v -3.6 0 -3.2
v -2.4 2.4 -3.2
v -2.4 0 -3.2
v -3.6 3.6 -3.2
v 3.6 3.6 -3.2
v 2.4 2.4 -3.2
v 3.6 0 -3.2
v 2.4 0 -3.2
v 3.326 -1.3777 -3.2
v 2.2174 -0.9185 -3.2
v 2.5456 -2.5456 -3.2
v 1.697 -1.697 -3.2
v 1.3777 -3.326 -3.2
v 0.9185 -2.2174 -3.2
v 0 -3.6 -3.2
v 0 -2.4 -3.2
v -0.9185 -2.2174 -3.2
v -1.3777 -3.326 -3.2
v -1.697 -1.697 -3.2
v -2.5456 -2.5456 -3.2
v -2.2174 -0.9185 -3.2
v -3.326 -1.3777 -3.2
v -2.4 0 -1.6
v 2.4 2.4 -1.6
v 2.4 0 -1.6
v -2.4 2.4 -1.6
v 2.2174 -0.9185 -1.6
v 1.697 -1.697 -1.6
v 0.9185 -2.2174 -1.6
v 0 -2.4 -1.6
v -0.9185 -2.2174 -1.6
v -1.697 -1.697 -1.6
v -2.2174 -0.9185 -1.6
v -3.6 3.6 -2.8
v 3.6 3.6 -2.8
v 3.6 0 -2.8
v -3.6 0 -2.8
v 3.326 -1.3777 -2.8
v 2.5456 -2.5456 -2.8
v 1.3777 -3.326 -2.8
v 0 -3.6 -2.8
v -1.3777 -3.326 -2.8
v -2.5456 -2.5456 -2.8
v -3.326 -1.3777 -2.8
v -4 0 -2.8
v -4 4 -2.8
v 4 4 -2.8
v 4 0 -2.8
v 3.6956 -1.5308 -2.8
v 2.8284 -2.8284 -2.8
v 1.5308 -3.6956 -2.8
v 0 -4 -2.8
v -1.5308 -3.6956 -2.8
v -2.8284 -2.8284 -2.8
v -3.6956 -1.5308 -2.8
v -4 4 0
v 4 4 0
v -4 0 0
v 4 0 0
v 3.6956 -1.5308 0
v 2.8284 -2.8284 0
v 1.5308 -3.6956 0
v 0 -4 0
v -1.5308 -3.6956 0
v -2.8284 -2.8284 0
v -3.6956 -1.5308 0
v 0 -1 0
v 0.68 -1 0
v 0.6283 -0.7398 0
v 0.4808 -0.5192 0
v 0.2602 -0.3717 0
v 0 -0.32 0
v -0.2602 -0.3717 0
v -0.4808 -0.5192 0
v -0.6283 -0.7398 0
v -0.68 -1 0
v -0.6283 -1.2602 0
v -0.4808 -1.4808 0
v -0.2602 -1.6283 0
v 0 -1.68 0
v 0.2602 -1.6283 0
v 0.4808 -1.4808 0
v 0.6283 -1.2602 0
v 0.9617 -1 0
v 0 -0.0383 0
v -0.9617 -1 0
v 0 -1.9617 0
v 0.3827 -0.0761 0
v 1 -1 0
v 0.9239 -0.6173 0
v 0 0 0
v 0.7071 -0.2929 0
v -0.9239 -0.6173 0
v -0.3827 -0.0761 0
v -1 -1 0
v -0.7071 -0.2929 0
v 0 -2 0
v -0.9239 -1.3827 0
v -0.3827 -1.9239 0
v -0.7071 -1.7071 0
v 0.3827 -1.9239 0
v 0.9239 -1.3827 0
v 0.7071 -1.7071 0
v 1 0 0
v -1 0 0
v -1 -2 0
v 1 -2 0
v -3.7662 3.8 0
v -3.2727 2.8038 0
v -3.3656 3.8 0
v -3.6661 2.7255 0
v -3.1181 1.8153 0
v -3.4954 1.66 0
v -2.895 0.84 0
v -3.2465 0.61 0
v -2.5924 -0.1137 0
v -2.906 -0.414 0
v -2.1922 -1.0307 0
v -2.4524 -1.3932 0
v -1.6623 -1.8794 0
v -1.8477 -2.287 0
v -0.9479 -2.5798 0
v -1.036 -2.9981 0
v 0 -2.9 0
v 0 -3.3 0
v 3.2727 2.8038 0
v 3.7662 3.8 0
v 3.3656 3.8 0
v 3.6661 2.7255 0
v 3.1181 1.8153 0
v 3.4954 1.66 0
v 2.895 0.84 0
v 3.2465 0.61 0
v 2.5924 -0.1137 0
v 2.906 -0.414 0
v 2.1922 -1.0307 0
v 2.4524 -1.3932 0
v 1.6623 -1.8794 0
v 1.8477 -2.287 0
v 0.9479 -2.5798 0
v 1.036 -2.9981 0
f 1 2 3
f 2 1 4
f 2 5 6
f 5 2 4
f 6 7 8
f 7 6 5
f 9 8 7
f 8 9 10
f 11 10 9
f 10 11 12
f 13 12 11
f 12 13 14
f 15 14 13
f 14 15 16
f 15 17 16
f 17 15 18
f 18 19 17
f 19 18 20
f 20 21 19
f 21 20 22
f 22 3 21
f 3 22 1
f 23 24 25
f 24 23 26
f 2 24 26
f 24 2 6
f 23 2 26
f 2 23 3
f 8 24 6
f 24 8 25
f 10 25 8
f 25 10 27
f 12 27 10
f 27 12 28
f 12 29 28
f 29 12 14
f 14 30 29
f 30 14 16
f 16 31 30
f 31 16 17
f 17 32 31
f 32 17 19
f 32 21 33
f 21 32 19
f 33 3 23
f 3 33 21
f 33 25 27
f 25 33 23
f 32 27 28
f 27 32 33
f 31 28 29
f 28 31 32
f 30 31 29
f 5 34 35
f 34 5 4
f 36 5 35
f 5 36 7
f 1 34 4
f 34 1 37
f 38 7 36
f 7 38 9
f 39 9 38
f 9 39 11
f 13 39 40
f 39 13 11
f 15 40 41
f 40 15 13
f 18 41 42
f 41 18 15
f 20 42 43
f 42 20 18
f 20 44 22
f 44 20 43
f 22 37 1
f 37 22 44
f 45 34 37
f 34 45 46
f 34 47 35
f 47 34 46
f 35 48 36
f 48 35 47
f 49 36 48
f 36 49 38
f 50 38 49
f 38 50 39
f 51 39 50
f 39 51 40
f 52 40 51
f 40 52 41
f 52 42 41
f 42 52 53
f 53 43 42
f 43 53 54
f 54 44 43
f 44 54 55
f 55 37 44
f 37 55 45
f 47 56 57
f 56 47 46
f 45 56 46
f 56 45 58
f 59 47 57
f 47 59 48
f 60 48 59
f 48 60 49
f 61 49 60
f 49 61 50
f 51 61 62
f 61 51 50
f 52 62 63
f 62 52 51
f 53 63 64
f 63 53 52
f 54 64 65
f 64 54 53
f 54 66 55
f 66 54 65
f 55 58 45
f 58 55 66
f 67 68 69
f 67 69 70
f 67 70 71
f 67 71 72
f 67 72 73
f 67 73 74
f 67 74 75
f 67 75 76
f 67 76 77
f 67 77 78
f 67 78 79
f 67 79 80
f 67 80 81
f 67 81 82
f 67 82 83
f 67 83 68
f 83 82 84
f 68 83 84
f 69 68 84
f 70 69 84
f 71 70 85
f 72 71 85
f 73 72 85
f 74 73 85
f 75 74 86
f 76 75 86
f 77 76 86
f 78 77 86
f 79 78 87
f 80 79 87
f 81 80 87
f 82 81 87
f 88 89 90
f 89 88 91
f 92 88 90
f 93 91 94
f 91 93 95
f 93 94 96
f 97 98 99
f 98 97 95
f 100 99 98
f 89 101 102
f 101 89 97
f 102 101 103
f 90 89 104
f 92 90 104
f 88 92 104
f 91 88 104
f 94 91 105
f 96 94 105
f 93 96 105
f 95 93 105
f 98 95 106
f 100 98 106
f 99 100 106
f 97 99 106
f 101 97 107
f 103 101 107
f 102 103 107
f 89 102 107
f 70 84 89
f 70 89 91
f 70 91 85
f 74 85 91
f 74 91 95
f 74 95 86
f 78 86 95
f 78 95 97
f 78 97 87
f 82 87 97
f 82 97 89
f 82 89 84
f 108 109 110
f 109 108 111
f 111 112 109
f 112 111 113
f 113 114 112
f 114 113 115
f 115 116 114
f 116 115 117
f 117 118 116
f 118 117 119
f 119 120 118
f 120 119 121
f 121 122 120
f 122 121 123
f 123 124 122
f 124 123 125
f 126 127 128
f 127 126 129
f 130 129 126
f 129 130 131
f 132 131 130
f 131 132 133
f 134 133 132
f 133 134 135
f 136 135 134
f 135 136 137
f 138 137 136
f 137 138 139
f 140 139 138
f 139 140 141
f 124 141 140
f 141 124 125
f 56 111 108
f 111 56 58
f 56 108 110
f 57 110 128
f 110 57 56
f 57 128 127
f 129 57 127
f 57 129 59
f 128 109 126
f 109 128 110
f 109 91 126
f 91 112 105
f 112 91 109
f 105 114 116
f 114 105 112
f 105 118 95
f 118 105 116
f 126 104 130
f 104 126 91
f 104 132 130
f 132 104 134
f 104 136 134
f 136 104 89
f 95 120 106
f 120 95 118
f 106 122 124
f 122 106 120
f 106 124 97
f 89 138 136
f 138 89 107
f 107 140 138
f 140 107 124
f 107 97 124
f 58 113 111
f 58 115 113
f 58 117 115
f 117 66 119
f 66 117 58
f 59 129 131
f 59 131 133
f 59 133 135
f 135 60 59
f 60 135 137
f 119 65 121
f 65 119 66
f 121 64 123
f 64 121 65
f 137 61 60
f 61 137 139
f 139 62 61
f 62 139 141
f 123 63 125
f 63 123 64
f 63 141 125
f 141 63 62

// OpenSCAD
// file: ../p/2-4edge.scad
use <../lib.scad>
function ldraw_lib__2_4edge() = [
// 0 Circle 0.5
// 0 Name: 2-4edge.dat
// 0 Author: James Jessiman
// 0 !LDRAW_ORG Primitive UPDATE 2017-01
// 0 !LICENSE Licensed under CC BY 4.0 : see CAreadme.txt
// 
// 0 BFC CERTIFY CCW
  [0,"BFC","CERTIFY"],
  [0,"BFC","CCW"],
// 
// 0 !HISTORY 2007-06-24 [PTadmin] Header formatted for Contributor Agreement
// 0 !HISTORY 2008-07-01 [PTadmin] Official Update 2008-01
// 0 !HISTORY 2017-01-15 [Steffen] BFCed
// 0 !HISTORY 2017-12-30 [PTadmin] Official Update 2017-01
// 
// 
// 2 24 1 0 0 0.9239 0 0.3827
  [2,24,1,0,0,0.9239,0,0.3827],
// 2 24 0.9239 0 0.3827 0.7071 0 0.7071
  [2,24,0.9239,0,0.3827,0.7071,0,0.7071],
// 2 24 0.7071 0 0.7071 0.3827 0 0.9239
  [2,24,0.7071,0,0.7071,0.3827,0,0.9239],
// 2 24 0.3827 0 0.9239 0 0 1
  [2,24,0.3827,0,0.9239,0,0,1],
// 2 24 0 0 1 -0.3827 0 0.9239
  [2,24,0,0,1,-0.3827,0,0.9239],
// 2 24 -0.3827 0 0.9239 -0.7071 0 0.7071
  [2,24,-0.3827,0,0.9239,-0.7071,0,0.7071],
// 2 24 -0.7071 0 0.7071 -0.9239 0 0.3827
  [2,24,-0.7071,0,0.7071,-0.9239,0,0.3827],
// 2 24 -0.9239 0 0.3827 -1 0 0
  [2,24,-0.9239,0,0.3827,-1,0,0],
];
module ldraw_lib__2_4edge(step=0, col=false, unit=2/5, alt=false, line=0.2, solid=!$preview)
    makepoly(ldraw_lib__2_4edge(), step=step, col=col, unit=unit, alt=alt, line=line, solid=solid);
ldraw_lib__2_4edge(line=0.2);
// file: ../p/2-4cyli.scad
use <../lib.scad>
function ldraw_lib__2_4cyli() = [
// 0 Cylinder 0.5
// 0 Name: 2-4cyli.dat
// 0 Author: James Jessiman
// 0 !LDRAW_ORG Primitive UPDATE 2005-01
// 0 !LICENSE Licensed under CC BY 4.0 : see CAreadme.txt
// 
// 0 BFC CERTIFY CCW
  [0,"BFC","CERTIFY"],
  [0,"BFC","CCW"],
// 
// 0 !HISTORY 2002-03-23 [sbliss] Added BFC statement; compacted code
// 0 !HISTORY 2002-04-25 [PTadmin] Official Update 2002-02
// 0 !HISTORY 2004-12-11 [nielsk] Recreated using Primitive Generator, Edge lines fixed, BFC changed to CCW
// 0 !HISTORY 2005-12-28 [PTadmin] Official Update 2005-01
// 0 !HISTORY 2007-06-24 [PTadmin] Header formatted for Contributor Agreement
// 0 !HISTORY 2008-07-01 [PTadmin] Official Update 2008-01
// 
// 
// 4 16 .9239 1 .3827 .9239 0 .3827 1 0 0 1 1 0
  [4,16,.9239,1,.3827,.9239,0,.3827,1,0,0,1,1,0],
// 4 16 .7071 1 .7071 .7071 0 .7071 .9239 0 .3827 .9239 1 .3827
  [4,16,.7071,1,.7071,.7071,0,.7071,.9239,0,.3827,.9239,1,.3827],
// 4 16 .3827 1 .9239 .3827 0 .9239 .7071 0 .7071 .7071 1 .7071
  [4,16,.3827,1,.9239,.3827,0,.9239,.7071,0,.7071,.7071,1,.7071],
// 4 16 0 1 1 0 0 1 .3827 0 .9239 .3827 1 .9239
  [4,16,0,1,1,0,0,1,.3827,0,.9239,.3827,1,.9239],
// 4 16 -.3827 1 .9239 -.3827 0 .9239 0 0 1 0 1 1
  [4,16,-.3827,1,.9239,-.3827,0,.9239,0,0,1,0,1,1],
// 4 16 -.7071 1 .7071 -.7071 0 .7071 -.3827 0 .9239 -.3827 1 .9239
  [4,16,-.7071,1,.7071,-.7071,0,.7071,-.3827,0,.9239,-.3827,1,.9239],
// 4 16 -.9239 1 .3827 -.9239 0 .3827 -.7071 0 .7071 -.7071 1 .7071
  [4,16,-.9239,1,.3827,-.9239,0,.3827,-.7071,0,.7071,-.7071,1,.7071],
// 4 16 -1 1 0 -1 0 0 -.9239 0 .3827 -.9239 1 .3827
  [4,16,-1,1,0,-1,0,0,-.9239,0,.3827,-.9239,1,.3827],
// 5 24 1 1 0 1 0 0 1 1 -.4142 .9239 1 .3827
  [5,24,1,1,0,1,0,0,1,1,-.4142,.9239,1,.3827],
// 5 24 .9239 1 .3827 .9239 0 .3827 1 1 0 .7071 1 .7071
  [5,24,.9239,1,.3827,.9239,0,.3827,1,1,0,.7071,1,.7071],
// 5 24 .7071 1 .7071 .7071 0 .7071 .9239 1 .3827 .3827 1 .9239
  [5,24,.7071,1,.7071,.7071,0,.7071,.9239,1,.3827,.3827,1,.9239],
// 5 24 .3827 1 .9239 .3827 0 .9239 .7071 1 .7071 0 1 1
  [5,24,.3827,1,.9239,.3827,0,.9239,.7071,1,.7071,0,1,1],
// 5 24 0 1 1 0 0 1 .3827 1 .9239 -.3827 1 .9239
  [5,24,0,1,1,0,0,1,.3827,1,.9239,-.3827,1,.9239],
// 5 24 -.3827 1 .9239 -.3827 0 .9239 0 1 1 -.7071 1 .7071
  [5,24,-.3827,1,.9239,-.3827,0,.9239,0,1,1,-.7071,1,.7071],
// 5 24 -.7071 1 .7071 -.7071 0 .7071 -.3827 1 .9239 -.9239 1 .3827
  [5,24,-.7071,1,.7071,-.7071,0,.7071,-.3827,1,.9239,-.9239,1,.3827],
// 5 24 -.9239 1 .3827 -.9239 0 .3827 -.7071 1 .7071 -1 1 0
  [5,24,-.9239,1,.3827,-.9239,0,.3827,-.7071,1,.7071,-1,1,0],
// 5 24 -1 1 0 -1 0 0 -.9239 1 .3827 -1 1 -.4142
  [5,24,-1,1,0,-1,0,0,-.9239,1,.3827,-1,1,-.4142],
// 0
];
module ldraw_lib__2_4cyli(step=0, col=false, unit=2/5, alt=false, line=0.2, solid=!$preview)
    makepoly(ldraw_lib__2_4cyli(), step=step, col=col, unit=unit, alt=alt, line=line, solid=solid);
ldraw_lib__2_4cyli(line=0.2);
// file: ../p/empty.scad
use <../lib.scad>
function ldraw_lib__empty() = [
// 0 Empty
// 0 Name: empty.dat
// 0 Author: Steffen [Steffen]
// 0 !LDRAW_ORG Primitive UPDATE 2015-01
// 0 !LICENSE Licensed under CC BY 4.0 : see CAreadme.txt
// 
// 0 BFC CERTIFY CCW
  [0,"BFC","CERTIFY"],
  [0,"BFC","CCW"],
// 
// 0 !HISTORY 2015-10-11 [PTadmin] Official Update 2015-01
// 
// 
// 0 // Tool MLCad cannot handle really empty files. This file is used as a workaround.
// 0 // It exceptionally contains forbidden non-LDRAW standard syntax to satisfy MLCad until it is fixed OR a different editor has become the de-facto LDRAW standard.
// 0 // The line being used here is an "impossible" conditional line which never should be visible,
// 0 // additionally hidden by a syntax explicitly hiding it from displaying.
// 
// 0 MLCAD HIDE 5 24 0 0 0 0.0001 0 0 0.0001 -0.0001 0 0 0 0
];
module ldraw_lib__empty(step=0, col=false, unit=2/5, alt=false, line=0.2, solid=!$preview)
    makepoly(ldraw_lib__empty(), step=step, col=col, unit=unit, alt=alt, line=line, solid=solid);
ldraw_lib__empty(line=0.2);
// file: ../p/box4-4a.scad
use <../lib.scad>
function ldraw_lib__box4_4a() = [
// 0 Box with  4 Faces without  4 Adjacent Edges
// 0 Name: box4-4a.dat
// 0 Author: Willy Tschager [Holly-Wood]
// 0 !LDRAW_ORG Primitive UPDATE 2024-01
// 0 !LICENSE Licensed under CC BY 4.0 : see CAreadme.txt
// 
// 0 BFC CERTIFY CCW
  [0,"BFC","CERTIFY"],
  [0,"BFC","CCW"],
// 
// 0 !HISTORY 1998-07-15 [PTadmin] Official Update 1998-07
// 0 !HISTORY 2002-12-13 [hafhead] Made BFC compliant
// 0 !HISTORY 2003-03-12 [PTadmin] Official Update 2003-01
// 0 !HISTORY 2007-06-24 [PTadmin] Header formatted for Contributor Agreement
// 0 !HISTORY 2008-07-01 [PTadmin] Official Update 2008-01
// 0 !HISTORY 2012-02-16 [Philo] Changed to CCW
// 0 !HISTORY 2012-03-30 [PTadmin] Official Update 2012-01
// 0 !HISTORY 2024-01-03 [Holly-Wood] Complete re-write, original by Manfred Moolhuysen
// 0 !HISTORY 2024-01-29 [OrionP] Official Update 2024-01
// 
// 2 24 -1 1 -1 -1 1 1
  [2,24,-1,1,-1,-1,1,1],
// 2 24 1 1 1 1 1 -1
  [2,24,1,1,1,1,1,-1],
// 2 24 -1 1 1 1 1 1
  [2,24,-1,1,1,1,1,1],
// 4 16 1 1 1 1 1 -1 -1 1 -1 -1 1 1
  [4,16,1,1,1,1,1,-1,-1,1,-1,-1,1,1],
// 
// 2 24 -1 0 -1 -1 0 1
  [2,24,-1,0,-1,-1,0,1],
// 4 16 -1 1 1 -1 1 -1 -1 0 -1 -1 0 1
  [4,16,-1,1,1,-1,1,-1,-1,0,-1,-1,0,1],
// 
// 2 24 1 0 1 1 0 -1
  [2,24,1,0,1,1,0,-1],
// 4 16 1 1 -1 1 1 1 1 0 1 1 0 -1
  [4,16,1,1,-1,1,1,1,1,0,1,1,0,-1],
// 
// 2 24 1 1 1 1 0 1
  [2,24,1,1,1,1,0,1],
// 2 24 -1 1 1 -1 0 1
  [2,24,-1,1,1,-1,0,1],
// 2 24 -1 0 1 1 0 1
  [2,24,-1,0,1,1,0,1],
// 4 16 1 1 1 -1 1 1 -1 0 1 1 0 1
  [4,16,1,1,1,-1,1,1,-1,0,1,1,0,1],
];
module ldraw_lib__box4_4a(step=0, col=false, unit=2/5, alt=false, line=0.2, solid=!$preview)
    makepoly(ldraw_lib__box4_4a(), step=step, col=col, unit=unit, alt=alt, line=line, solid=solid);
ldraw_lib__box4_4a(line=0.2);
// file: ../p/box3u4a.scad
use <../lib.scad>
function ldraw_lib__box3u4a() = [
// 0 Box with 3 Faces without 4 Adjacent Edges
// 0 Name: box3u4a.dat
// 0 Author: Niels Karsdorp [nielsk]
// 0 !LDRAW_ORG Primitive UPDATE 2009-01
// 0 !LICENSE Licensed under CC BY 4.0 : see CAreadme.txt
// 
// 0 BFC CERTIFY CCW
  [0,"BFC","CERTIFY"],
  [0,"BFC","CCW"],
// 
// 0 !HISTORY 2009-05-02 [PTadmin] Official Update 2009-01
// 
// 
// 2 24 1 1 1 -1 1 1
  [2,24,1,1,1,-1,1,1],
// 2 24 -1 1 -1 1 1 -1
  [2,24,-1,1,-1,1,1,-1],
// 2 24 1 1 1 1 1 -1
  [2,24,1,1,1,1,1,-1],
// 2 24 -1 1 1 -1 1 -1
  [2,24,-1,1,1,-1,1,-1],
// 2 24 1 1 1 1 0 1
  [2,24,1,1,1,1,0,1],
// 2 24 1 1 -1 1 0 -1
  [2,24,1,1,-1,1,0,-1],
// 2 24 -1 1 1 -1 0 1
  [2,24,-1,1,1,-1,0,1],
// 2 24 -1 1 -1 -1 0 -1
  [2,24,-1,1,-1,-1,0,-1],
// 4 16 -1 1 -1 -1 1 1 1 1 1 1 1 -1
  [4,16,-1,1,-1,-1,1,1,1,1,1,1,1,-1],
// 4 16 -1 1 1 -1 0 1 1 0 1 1 1 1
  [4,16,-1,1,1,-1,0,1,1,0,1,1,1,1],
// 4 16 1 1 -1 1 0 -1 -1 0 -1 -1 1 -1
  [4,16,1,1,-1,1,0,-1,-1,0,-1,-1,1,-1],
// 0
];
module ldraw_lib__box3u4a(step=0, col=false, unit=2/5, alt=false, line=0.2, solid=!$preview)
    makepoly(ldraw_lib__box3u4a(), step=step, col=col, unit=unit, alt=alt, line=line, solid=solid);
ldraw_lib__box3u4a(line=0.2);
// file: ../p/2-4ring9.scad
use <../lib.scad>
function ldraw_lib__2_4ring9() = [
// 0 Ring  9 x 0.5
// 0 Name: 2-4ring9.dat
// 0 Author: Willy Tschager [Holly-Wood]
// 0 !LDRAW_ORG Primitive UPDATE 2024-01
// 0 !LICENSE Licensed under CC BY 4.0 : see CAreadme.txt
// 
// 0 BFC CERTIFY CCW
  [0,"BFC","CERTIFY"],
  [0,"BFC","CCW"],
// 
// 0 !HISTORY 2009-09-03 [PTadmin] Official Update 2009-02
// 0 !HISTORY 2024-01-10 [Holly-Wood] Complete regeneration, original by guyvivan
// 0 !HISTORY 2024-01-29 [OrionP] Official Update 2024-01
// 
// 4 16 10 0 0 9.239 0 3.827 8.3151 0 3.4443 9 0 0
  [4,16,10,0,0,9.239,0,3.827,8.3151,0,3.4443,9,0,0],
// 4 16 9.239 0 3.827 7.071 0 7.071 6.3639 0 6.3639 8.3151 0 3.4443
  [4,16,9.239,0,3.827,7.071,0,7.071,6.3639,0,6.3639,8.3151,0,3.4443],
// 4 16 7.071 0 7.071 3.827 0 9.239 3.4443 0 8.3151 6.3639 0 6.3639
  [4,16,7.071,0,7.071,3.827,0,9.239,3.4443,0,8.3151,6.3639,0,6.3639],
// 4 16 3.827 0 9.239 0 0 10 0 0 9 3.4443 0 8.3151
  [4,16,3.827,0,9.239,0,0,10,0,0,9,3.4443,0,8.3151],
// 4 16 0 0 10 -3.827 0 9.239 -3.4443 0 8.3151 0 0 9
  [4,16,0,0,10,-3.827,0,9.239,-3.4443,0,8.3151,0,0,9],
// 4 16 -3.827 0 9.239 -7.071 0 7.071 -6.3639 0 6.3639 -3.4443 0 8.3151
  [4,16,-3.827,0,9.239,-7.071,0,7.071,-6.3639,0,6.3639,-3.4443,0,8.3151],
// 4 16 -7.071 0 7.071 -9.239 0 3.827 -8.3151 0 3.4443 -6.3639 0 6.3639
  [4,16,-7.071,0,7.071,-9.239,0,3.827,-8.3151,0,3.4443,-6.3639,0,6.3639],
// 4 16 -9.239 0 3.827 -10 0 0 -9 0 0 -8.3151 0 3.4443
  [4,16,-9.239,0,3.827,-10,0,0,-9,0,0,-8.3151,0,3.4443],
// 0 // Build by LDPartEditor (PrimGen 2.X)
];
module ldraw_lib__2_4ring9(step=0, col=false, unit=2/5, alt=false, line=0.2, solid=!$preview)
    makepoly(ldraw_lib__2_4ring9(), step=step, col=col, unit=unit, alt=alt, line=line, solid=solid);
ldraw_lib__2_4ring9(line=0.2);
// file: ../p/2-4ring2.scad
use <../lib.scad>
function ldraw_lib__2_4ring2() = [
// 0 Ring  2 x 0.5
// 0 Name: 2-4ring2.dat
// 0 Author: Chris Dee [cwdee]
// 0 !LDRAW_ORG Primitive UPDATE 2012-01
// 0 !LICENSE Licensed under CC BY 4.0 : see CAreadme.txt
// 
// 0 BFC CERTIFY CCW
  [0,"BFC","CERTIFY"],
  [0,"BFC","CCW"],
// 
// 0 !HISTORY 2001-10-26 [PTadmin] Official Update 2001-01
// 0 !HISTORY 2007-06-24 [PTadmin] Header formatted for Contributor Agreement
// 0 !HISTORY 2008-07-01 [PTadmin] Official Update 2008-01
// 0 !HISTORY 2012-02-16 [Philo] Changed to CCW
// 0 !HISTORY 2012-03-30 [PTadmin] Official Update 2012-01
// 
// 
// 4 16 3 0 0 2.7717 0 1.1481 1.8478 0 0.7654 2 0 0
  [4,16,3,0,0,2.7717,0,1.1481,1.8478,0,0.7654,2,0,0],
// 4 16 2.7717 0 1.1481 2.1213 0 2.1213 1.4142 0 1.4142 1.8478 0 0.7654
  [4,16,2.7717,0,1.1481,2.1213,0,2.1213,1.4142,0,1.4142,1.8478,0,0.7654],
// 4 16 2.1213 0 2.1213 1.1481 0 2.7717 0.7654 0 1.8478 1.4142 0 1.4142
  [4,16,2.1213,0,2.1213,1.1481,0,2.7717,0.7654,0,1.8478,1.4142,0,1.4142],
// 4 16 1.1481 0 2.7717 0 0 3 0 0 2 0.7654 0 1.8478
  [4,16,1.1481,0,2.7717,0,0,3,0,0,2,0.7654,0,1.8478],
// 4 16 0 0 3 -1.1481 0 2.7717 -0.7654 0 1.8478 0 0 2
  [4,16,0,0,3,-1.1481,0,2.7717,-0.7654,0,1.8478,0,0,2],
// 4 16 -1.1481 0 2.7717 -2.1213 0 2.1213 -1.4142 0 1.4142 -0.7654 0 1.8478
  [4,16,-1.1481,0,2.7717,-2.1213,0,2.1213,-1.4142,0,1.4142,-0.7654,0,1.8478],
// 4 16 -2.1213 0 2.1213 -2.7717 0 1.1481 -1.8478 0 0.7654 -1.4142 0 1.4142
  [4,16,-2.1213,0,2.1213,-2.7717,0,1.1481,-1.8478,0,0.7654,-1.4142,0,1.4142],
// 4 16 -2.7717 0 1.1481 -3 0 0 -2 0 0 -1.8478 0 0.7654
  [4,16,-2.7717,0,1.1481,-3,0,0,-2,0,0,-1.8478,0,0.7654],
];
module ldraw_lib__2_4ring2(step=0, col=false, unit=2/5, alt=false, line=0.2, solid=!$preview)
    makepoly(ldraw_lib__2_4ring2(), step=step, col=col, unit=unit, alt=alt, line=line, solid=solid);
ldraw_lib__2_4ring2(line=0.2);
// file: ../p/2-4cylo.scad
use <../lib.scad>
use <2-4cyli.scad>
use <2-4edge.scad>
function ldraw_lib__2_4cylo() = [
// 0 Cylinder Open 0.5
// 0 Name: 2-4cylo.dat
// 0 Author: Max Martin Richter [MMR1988]
// 0 !LDRAW_ORG Primitive UPDATE 2010-03
// 0 !LICENSE Licensed under CC BY 4.0 : see CAreadme.txt
// 
// 0 BFC CERTIFY CCW
  [0,"BFC","CERTIFY"],
  [0,"BFC","CCW"],
// 
// 0 !HISTORY 2010-12-31 [PTadmin] Official Update 2010-03
// 
// 
// 1 16 0 0 0 1 0 0 0 1 0 0 0 1 2-4edge.dat
  [1,16,0,0,0,1,0,0,0,1,0,0,0,1, ldraw_lib__2_4edge()],
// 1 16 0 1 0 1 0 0 0 1 0 0 0 1 2-4edge.dat
  [1,16,0,1,0,1,0,0,0,1,0,0,0,1, ldraw_lib__2_4edge()],
// 1 16 0 0 0 1 0 0 0 1 0 0 0 1 2-4cyli.dat
  [1,16,0,0,0,1,0,0,0,1,0,0,0,1, ldraw_lib__2_4cyli()],
];
module ldraw_lib__2_4cylo(step=0, col=false, unit=2/5, alt=false, line=0.2, solid=!$preview)
    makepoly(ldraw_lib__2_4cylo(), step=step, col=col, unit=unit, alt=alt, line=line, solid=solid);
ldraw_lib__2_4cylo(line=0.2);
// file: ../p/2-4chrd.scad
use <../lib.scad>
function ldraw_lib__2_4chrd() = [
// 0 Chord 0.5
// 0 Name: 2-4chrd.dat
// 0 Author: Philippe Hurbain [Philo]
// 0 !LDRAW_ORG Primitive UPDATE 2014-01
// 0 !LICENSE Licensed under CC BY 4.0 : see CAreadme.txt
// 
// 0 BFC CERTIFY CCW
  [0,"BFC","CERTIFY"],
  [0,"BFC","CCW"],
// 
// 0 !HISTORY 2014-06-21 [PTadmin] Official Update 2014-01
// 
// 
// 4 16 0.9239 0 0.3827 -0.9239 0 0.3827 -1 0 0 1 0 0
  [4,16,0.9239,0,0.3827,-0.9239,0,0.3827,-1,0,0,1,0,0],
// 4 16 0.7071 0 0.7071 -0.7071 0 0.7071 -0.9239 0 0.3827 0.9239 0 0.3827
  [4,16,0.7071,0,0.7071,-0.7071,0,0.7071,-0.9239,0,0.3827,0.9239,0,0.3827],
// 4 16 0.3827 0 0.9239 -0.3827 0 0.9239 -0.7071 0 0.7071 0.7071 0 0.7071
  [4,16,0.3827,0,0.9239,-0.3827,0,0.9239,-0.7071,0,0.7071,0.7071,0,0.7071],
// 3 16 0 0 1 -0.3827 0 0.9239 0.3827 0 0.9239
  [3,16,0,0,1,-0.3827,0,0.9239,0.3827,0,0.9239],
];
module ldraw_lib__2_4chrd(step=0, col=false, unit=2/5, alt=false, line=0.2, solid=!$preview)
    makepoly(ldraw_lib__2_4chrd(), step=step, col=col, unit=unit, alt=alt, line=line, solid=solid);
ldraw_lib__2_4chrd(line=0.2);
// file: ../p/1-16chrd.scad
use <../lib.scad>
use <empty.scad>
function ldraw_lib__1_16chrd() = [
// 0 Chord 0.0625
// 0 Name: 1-16chrd.dat
// 0 Author: Philippe Hurbain [Philo]
// 0 !LDRAW_ORG Primitive UPDATE 2015-01
// 0 !LICENSE Licensed under CC BY 4.0 : see CAreadme.txt
// 
// 0 BFC CERTIFY CCW
  [0,"BFC","CERTIFY"],
  [0,"BFC","CCW"],
// 
// 0 !HISTORY 2015-10-11 [PTadmin] Official Update 2015-01
// 
// 
// 0 // This file is intentionally empty because at the current \P resolution,
// 0 // an 1-16chrd is actually empty. However, this file still is present
// 0 // to allow tools to do primitives substition and fill in a real chrd here,
// 0 // or, if desired, to substitute this with the hi-res 48\1-16chrd.
// 
// 0 // This file is based on an idea by Darats at http://forums.ldraw.org/read.php?19,14500,14500#msg-14500
// 
// 1 16 0 0 0 1 0 0 0 1 0 0 0 1 empty.dat
  [1,16,0,0,0,1,0,0,0,1,0,0,0,1, ldraw_lib__empty()],
];
module ldraw_lib__1_16chrd(step=0, col=false, unit=2/5, alt=false, line=0.2, solid=!$preview)
    makepoly(ldraw_lib__1_16chrd(), step=step, col=col, unit=unit, alt=alt, line=line, solid=solid);
ldraw_lib__1_16chrd(line=0.2);
// file: s/24246s02.scad
use <../../lib.scad>
use <../../p/2-4chrd.scad>
use <../../p/2-4cylo.scad>
use <../../p/2-4ring2.scad>
use <../../p/2-4ring9.scad>
use <../../p/box3u4a.scad>
use <../../p/box4-4a.scad>
function ldraw_lib__s__24246s02() = [
// 0 ~Tile  1 x  1 with Rounded End without Complete Top Face
// 0 Name: s\24246s02.dat
// 0 Author: Magnus Forsberg [MagFors]
// 0 !LDRAW_ORG Subpart UPDATE 2020-02
// 0 !LICENSE Licensed under CC BY 4.0 : see CAreadme.txt
// 
// 0 BFC CERTIFY CCW
  [0,"BFC","CERTIFY"],
  [0,"BFC","CCW"],
// 
// 0 !HISTORY 2020-09-05 [PTadmin] Official Update 2020-02
// 
// 
// 4 16 -9 8 0 -9 8 9 -6 8 6 -6 8 0
  [4,16,-9,8,0,-9,8,9,-6,8,6,-6,8,0],
// 4 16 -9 8 9 9 8 9 6 8 6 -6 8 6
  [4,16,-9,8,9,9,8,9,6,8,6,-6,8,6],
// 4 16 9 8 9 9 8 0 6 8 0 6 8 6
  [4,16,9,8,9,9,8,0,6,8,0,6,8,6],
// 1 16 0 8 0 3 0 0 0 -1 0 0 0 -3 2-4ring2.dat
  [1,16,0,8,0,3,0,0,0,-1,0,0,0,-3, ldraw_lib__2_4ring2()],
// 0 BFC INVERTNEXT
  [0,"BFC","INVERTNEXT"],
// 1 16 0 8 3 6 0 0 0 -4 0 0 0 3 box4-4a.dat
  [1,16,0,8,3,6,0,0,0,-4,0,0,0,3, ldraw_lib__box4_4a()],
// 0 BFC INVERTNEXT
  [0,"BFC","INVERTNEXT"],
// 1 16 0 4 0 6 0 0 0 4 0 0 0 -6 2-4cylo.dat
  [1,16,0,4,0,6,0,0,0,4,0,0,0,-6, ldraw_lib__2_4cylo()],
// 1 16 0 4 0 6 0 0 0 -4 0 0 0 -6 2-4chrd.dat
  [1,16,0,4,0,6,0,0,0,-4,0,0,0,-6, ldraw_lib__2_4chrd()],
// 1 16 0 7.5 0 0 0 9 0.5 0 0 0 9 0 box3u4a.dat
  [1,16,0,7.5,0,0,0,9,0.5,0,0,0,9,0, ldraw_lib__box3u4a()],
// 1 16 0 7 0 9 0 0 0 1 0 0 0 -9 2-4cylo.dat
  [1,16,0,7,0,9,0,0,0,1,0,0,0,-9, ldraw_lib__2_4cylo()],
// 4 16 -10 7 0 -10 7 10 -9 7 9 -9 7 0
  [4,16,-10,7,0,-10,7,10,-9,7,9,-9,7,0],
// 4 16 -10 7 10 10 7 10 9 7 9 -9 7 9
  [4,16,-10,7,10,10,7,10,9,7,9,-9,7,9],
// 4 16 10 7 10 10 7 0 9 7 0 9 7 9
  [4,16,10,7,10,10,7,0,9,7,0,9,7,9],
// 1 16 0 7 0 1 0 0 0 -1 0 0 0 -1 2-4ring9.dat
  [1,16,0,7,0,1,0,0,0,-1,0,0,0,-1, ldraw_lib__2_4ring9()],
// 1 16 0 3.5 0 0 0 -10 -3.5 0 0 0 10 0 box3u4a.dat
  [1,16,0,3.5,0,0,0,-10,-3.5,0,0,0,10,0, ldraw_lib__box3u4a()],
// 1 16 0 0 0 10 0 0 0 7 0 0 0 -10 2-4cylo.dat
  [1,16,0,0,0,10,0,0,0,7,0,0,0,-10, ldraw_lib__2_4cylo()],
];
module ldraw_lib__s__24246s02(step=0, col=false, unit=2/5, alt=false, line=0.2, solid=!$preview)
    makepoly(ldraw_lib__s__24246s02(), step=step, col=col, unit=unit, alt=alt, line=line, solid=solid);
ldraw_lib__s__24246s02(line=0.2);
// file: ../p/4-4ndis.scad
use <../lib.scad>
function ldraw_lib__4_4ndis() = [
// 0 Disc Negative 1.0
// 0 Name: 4-4ndis.dat
// 0 Author: James Jessiman
// 0 !LDRAW_ORG Primitive UPDATE 2012-01
// 0 !LICENSE Licensed under CC BY 4.0 : see CAreadme.txt
// 
// 0 BFC CERTIFY CCW
  [0,"BFC","CERTIFY"],
  [0,"BFC","CCW"],
// 
// 0 !HISTORY 2002-03-23 [sbliss] Added BFC statement; compacted code
// 0 !HISTORY 2002-04-25 [PTadmin] Official Update 2002-02
// 0 !HISTORY 2007-06-24 [PTadmin] Header formatted for Contributor Agreement
// 0 !HISTORY 2008-07-01 [PTadmin] Official Update 2008-01
// 0 !HISTORY 2012-02-16 [Philo] Changed to CCW
// 0 !HISTORY 2012-03-30 [PTadmin] Official Update 2012-01
// 
// 
// 3 16 0.9239 0 0.3827 1 0 0 1 0 1
  [3,16,0.9239,0,0.3827,1,0,0,1,0,1],
// 3 16 0.7071 0 0.7071 0.9239 0 0.3827 1 0 1
  [3,16,0.7071,0,0.7071,0.9239,0,0.3827,1,0,1],
// 3 16 0.3827 0 0.9239 0.7071 0 0.7071 1 0 1
  [3,16,0.3827,0,0.9239,0.7071,0,0.7071,1,0,1],
// 3 16 0 0 1 0.3827 0 0.9239 1 0 1
  [3,16,0,0,1,0.3827,0,0.9239,1,0,1],
// 3 16 -0.3827 0 0.9239 0 0 1 -1 0 1
  [3,16,-0.3827,0,0.9239,0,0,1,-1,0,1],
// 3 16 -0.7071 0 0.7071 -0.3827 0 0.9239 -1 0 1
  [3,16,-0.7071,0,0.7071,-0.3827,0,0.9239,-1,0,1],
// 3 16 -0.9239 0 0.3827 -0.7071 0 0.7071 -1 0 1
  [3,16,-0.9239,0,0.3827,-0.7071,0,0.7071,-1,0,1],
// 3 16 -1 0 0 -0.9239 0 0.3827 -1 0 1
  [3,16,-1,0,0,-0.9239,0,0.3827,-1,0,1],
// 3 16 -0.9239 0 -0.3827 -1 0 0 -1 0 -1
  [3,16,-0.9239,0,-0.3827,-1,0,0,-1,0,-1],
// 3 16 -0.7071 0 -0.7071 -0.9239 0 -0.3827 -1 0 -1
  [3,16,-0.7071,0,-0.7071,-0.9239,0,-0.3827,-1,0,-1],
// 3 16 -0.3827 0 -0.9239 -0.7071 0 -0.7071 -1 0 -1
  [3,16,-0.3827,0,-0.9239,-0.7071,0,-0.7071,-1,0,-1],
// 3 16 0 0 -1 -0.3827 0 -0.9239 -1 0 -1
  [3,16,0,0,-1,-0.3827,0,-0.9239,-1,0,-1],
// 3 16 0.3827 0 -0.9239 0 0 -1 1 0 -1
  [3,16,0.3827,0,-0.9239,0,0,-1,1,0,-1],
// 3 16 0.7071 0 -0.7071 0.3827 0 -0.9239 1 0 -1
  [3,16,0.7071,0,-0.7071,0.3827,0,-0.9239,1,0,-1],
// 3 16 0.9239 0 -0.3827 0.7071 0 -0.7071 1 0 -1
  [3,16,0.9239,0,-0.3827,0.7071,0,-0.7071,1,0,-1],
// 3 16 1 0 0 0.9239 0 -0.3827 1 0 -1
  [3,16,1,0,0,0.9239,0,-0.3827,1,0,-1],
];
module ldraw_lib__4_4ndis(step=0, col=false, unit=2/5, alt=false, line=0.2, solid=!$preview)
    makepoly(ldraw_lib__4_4ndis(), step=step, col=col, unit=unit, alt=alt, line=line, solid=solid);
ldraw_lib__4_4ndis(line=0.2);
// file: ../p/4-4disc.scad
use <../lib.scad>
function ldraw_lib__4_4disc() = [
// 0 Disc 1.0
// 0 Name: 4-4disc.dat
// 0 Author: James Jessiman
// 0 !LDRAW_ORG Primitive UPDATE 2002-02
// 0 !LICENSE Licensed under CC BY 4.0 : see CAreadme.txt
// 
// 0 BFC CERTIFY CCW
  [0,"BFC","CERTIFY"],
  [0,"BFC","CCW"],
// 
// 0 !HISTORY 1998-12-15 [PTadmin] Official Update 1998-10
// 0 !HISTORY 2002-03-23 [sbliss] Added BFC statement
// 0 !HISTORY 2002-04-25 [PTadmin] Official Update 2002-02
// 0 !HISTORY 2007-06-24 [PTadmin] Header formatted for Contributor Agreement
// 0 !HISTORY 2008-07-01 [PTadmin] Official Update 2008-01
// 
// 
// 3 16 0 0 0 1 0 0 0.9239 0 0.3827
  [3,16,0,0,0,1,0,0,0.9239,0,0.3827],
// 3 16 0 0 0 0.9239 0 0.3827 0.7071 0 0.7071
  [3,16,0,0,0,0.9239,0,0.3827,0.7071,0,0.7071],
// 3 16 0 0 0 0.7071 0 0.7071 0.3827 0 0.9239
  [3,16,0,0,0,0.7071,0,0.7071,0.3827,0,0.9239],
// 3 16 0 0 0 0.3827 0 0.9239 0 0 1
  [3,16,0,0,0,0.3827,0,0.9239,0,0,1],
// 3 16 0 0 0 0 0 1 -0.3827 0 0.9239
  [3,16,0,0,0,0,0,1,-0.3827,0,0.9239],
// 3 16 0 0 0 -0.3827 0 0.9239 -0.7071 0 0.7071
  [3,16,0,0,0,-0.3827,0,0.9239,-0.7071,0,0.7071],
// 3 16 0 0 0 -0.7071 0 0.7071 -0.9239 0 0.3827
  [3,16,0,0,0,-0.7071,0,0.7071,-0.9239,0,0.3827],
// 3 16 0 0 0 -0.9239 0 0.3827 -1 0 -0
  [3,16,0,0,0,-0.9239,0,0.3827,-1,0,-0],
// 3 16 0 0 0 -1 0 -0 -0.9239 0 -0.3827
  [3,16,0,0,0,-1,0,-0,-0.9239,0,-0.3827],
// 3 16 0 0 0 -0.9239 0 -0.3827 -0.7071 0 -0.7071
  [3,16,0,0,0,-0.9239,0,-0.3827,-0.7071,0,-0.7071],
// 3 16 0 0 0 -0.7071 0 -0.7071 -0.3827 0 -0.9239
  [3,16,0,0,0,-0.7071,0,-0.7071,-0.3827,0,-0.9239],
// 3 16 0 0 0 -0.3827 0 -0.9239 0 0 -1
  [3,16,0,0,0,-0.3827,0,-0.9239,0,0,-1],
// 3 16 0 0 0 0 0 -1 0.3827 0 -0.9239
  [3,16,0,0,0,0,0,-1,0.3827,0,-0.9239],
// 3 16 0 0 0 0.3827 0 -0.9239 0.7071 0 -0.7071
  [3,16,0,0,0,0.3827,0,-0.9239,0.7071,0,-0.7071],
// 3 16 0 0 0 0.7071 0 -0.7071 0.9239 0 -0.3827
  [3,16,0,0,0,0.7071,0,-0.7071,0.9239,0,-0.3827],
// 3 16 0 0 0 0.9239 0 -0.3827 1 0 0
  [3,16,0,0,0,0.9239,0,-0.3827,1,0,0],
// 0
];
module ldraw_lib__4_4disc(step=0, col=false, unit=2/5, alt=false, line=0.2, solid=!$preview)
    makepoly(ldraw_lib__4_4disc(), step=step, col=col, unit=unit, alt=alt, line=line, solid=solid);
ldraw_lib__4_4disc(line=0.2);
// file: ../p/2-4ering.scad
use <../lib.scad>
use <1-16chrd.scad>
function ldraw_lib__2_4ering() = [
// 0 Adapter Ring Triangles to Normal 0.5
// 0 Name: 2-4ering.dat
// 0 Author: Damien Roux [Darats]
// 0 !LDRAW_ORG Primitive UPDATE 2019-03
// 0 !LICENSE Licensed under CC BY 4.0 : see CAreadme.txt
// 
// 0 BFC CERTIFY CCW
  [0,"BFC","CERTIFY"],
  [0,"BFC","CCW"],
// 
// 0 !HISTORY 2019-12-27 [PTadmin] Official Update 2019-03
// 
// 
// 0 // This file uses 1-16chrd (actually empty). It allows
// 0 // tools to do primitives substition and fill in a ring of chrd here,
// 0 // or, if desired, to substitute this with the hi-res 48\1-16chrd.
// 0 // This file is based on an idea by Darats at http://forums.ldraw.org/read.php?19,14500,14500#msg-14500
// 
// 1 16 0 0 0 1 0 0 0 1 0 0 0 1 1-16chrd.dat
  [1,16,0,0,0,1,0,0,0,1,0,0,0,1, ldraw_lib__1_16chrd()],
// 1 16 0 0 0 0 0 -1 0 1 0 1 0 0 1-16chrd.dat
  [1,16,0,0,0,0,0,-1,0,1,0,1,0,0, ldraw_lib__1_16chrd()],
// 1 16 0 0 0 0.38268 0 -0.92388 0 1 0 0.92388 0 0.38268 1-16chrd.dat
  [1,16,0,0,0,0.38268,0,-0.92388,0,1,0,0.92388,0,0.38268, ldraw_lib__1_16chrd()],
// 1 16 0 0 0 0.70711 0 -0.70711 0 1 0 0.70711 0 0.70711 1-16chrd.dat
  [1,16,0,0,0,0.70711,0,-0.70711,0,1,0,0.70711,0,0.70711, ldraw_lib__1_16chrd()],
// 1 16 0 0 0 0.92388 0 -0.38268 0 1 0 0.38268 0 0.92388 1-16chrd.dat
  [1,16,0,0,0,0.92388,0,-0.38268,0,1,0,0.38268,0,0.92388, ldraw_lib__1_16chrd()],
// 1 16 0 0 0 -0.92388 0 -0.38268 0 1 0 0.38268 0 -0.92388 1-16chrd.dat
  [1,16,0,0,0,-0.92388,0,-0.38268,0,1,0,0.38268,0,-0.92388, ldraw_lib__1_16chrd()],
// 1 16 0 0 0 -0.70711 0 -0.70711 0 1 0 0.70711 0 -0.70711 1-16chrd.dat
  [1,16,0,0,0,-0.70711,0,-0.70711,0,1,0,0.70711,0,-0.70711, ldraw_lib__1_16chrd()],
// 1 16 0 0 0 -0.38268 0 -0.92388 0 1 0 0.92388 0 -0.38268 1-16chrd.dat
  [1,16,0,0,0,-0.38268,0,-0.92388,0,1,0,0.92388,0,-0.38268, ldraw_lib__1_16chrd()],
];
module ldraw_lib__2_4ering(step=0, col=false, unit=2/5, alt=false, line=0.2, solid=!$preview)
    makepoly(ldraw_lib__2_4ering(), step=step, col=col, unit=unit, alt=alt, line=line, solid=solid);
ldraw_lib__2_4ering(line=0.2);
// file: ../p/1-4chrd.scad
use <../lib.scad>
function ldraw_lib__1_4chrd() = [
// 0 Chord 0.25
// 0 Name: 1-4chrd.dat
// 0 Author: Max Martin Richter [MMR1988]
// 0 !LDRAW_ORG Primitive UPDATE 2023-05
// 0 !LICENSE Licensed under CC BY 4.0 : see CAreadme.txt
// 
// 0 BFC CERTIFY CCW
  [0,"BFC","CERTIFY"],
  [0,"BFC","CCW"],
// 
// 0 !HISTORY 2004-04-22 [PTadmin] Official Update 2004-02
// 0 !HISTORY 2007-10-09 [PTadmin] Header formatted for Contributor Agreement
// 0 !HISTORY 2008-07-01 [PTadmin] Official Update 2008-01
// 0 !HISTORY 2012-08-02 [MMR1988] Re-creation with PrimGen2 and Rectifier
// 0 !HISTORY 2012-08-09 [PTadmin] Official Update 2012-02
// 0 !HISTORY 2023-10-27 [OrionP] Change author to MMR1988 from hafhead
// 0 !HISTORY 2023-10-31 [OrionP] Official Update 2023-05
// 
// 4 16 0.9239 0 0.3827 0.3827 0 0.9239 0 0 1 1 0 0
  [4,16,0.9239,0,0.3827,0.3827,0,0.9239,0,0,1,1,0,0],
// 3 16 0.7071 0 0.7071 0.3827 0 0.9239 0.9239 0 0.3827
  [3,16,0.7071,0,0.7071,0.3827,0,0.9239,0.9239,0,0.3827],
];
module ldraw_lib__1_4chrd(step=0, col=false, unit=2/5, alt=false, line=0.2, solid=!$preview)
    makepoly(ldraw_lib__1_4chrd(), step=step, col=col, unit=unit, alt=alt, line=line, solid=solid);
ldraw_lib__1_4chrd(line=0.2);
// main file
use <../lib.scad>
use <../p/1-4chrd.scad>
use <../p/2-4ering.scad>
use <../p/4-4disc.scad>
use <../p/4-4ndis.scad>
use <s/24246s02.scad>
function ldraw_lib__24246p07() = [
// 0 Tile  1 x  1 with Rounded End with Red Disc and Light Grey Arc Pattern
// 0 Name: 24246p07.dat
// 0 Author: Massimo Maso [Sirio]
// 0 !LDRAW_ORG Part UPDATE 2025-03
// 0 !LICENSE Licensed under CC BY 4.0 : see CAreadme.txt
// 
// 0 BFC CERTIFY CCW
  [0,"BFC","CERTIFY"],
  [0,"BFC","CCW"],
// 
// 0 !KEYWORDS Bricklink 24246pb046, Pagani, Rebrickable 24246pr0042, Set 76915
// 0 !KEYWORDS Speed Champions, Utopia
// 
// 0 !HISTORY 2023-06-24 [OrionP] Official Update 2023-03
// 0 !HISTORY 2025-02-27 [Lego-Manfred] References added
// 0 !HISTORY 2025-02-27 [OrionP] Official Update 2025-02
// 0 !HISTORY 2025-03-25 [MagFors] Update description
// 0 !HISTORY 2025-03-30 [OrionP] Official Update 2025-03
// 
// 0 // Subparts
// 1 16 0 0 0 1 0 0 0 1 0 0 0 1 s\24246s02.dat
  [1,16,0,0,0,1,0,0,0,1,0,0,0,1, ldraw_lib__s__24246s02()],
// 0 // Primitives
// 1 4 0 0 -2.5 1.7 0 0 0 1 0 0 0 1.7 4-4disc.dat
  [1,4,0,0,-2.5,1.7,0,0,0,1,0,0,0,1.7, ldraw_lib__4_4disc()],
// 1 71 0 0 -2.5 1.202082 0 1.202082 0 1 0 -1.202082 0 1.202082 4-4ndis.dat
  [1,71,0,0,-2.5,1.202082,0,1.202082,0,1,0,-1.202082,0,1.202082, ldraw_lib__4_4ndis()],
// 1 71 0 0 -2.5 2.5 0 0 0 1 0 0 0 2.5 1-4chrd.dat
  [1,71,0,0,-2.5,2.5,0,0,0,1,0,0,0,2.5, ldraw_lib__1_4chrd()],
// 1 71 0 0 -2.5 -2.5 0 0 0 1 0 0 0 2.5 1-4chrd.dat
  [1,71,0,0,-2.5,-2.5,0,0,0,1,0,0,0,2.5, ldraw_lib__1_4chrd()],
// 1 71 0 0 -2.5 -2.5 0 0 0 1 0 0 0 -2.5 1-4chrd.dat
  [1,71,0,0,-2.5,-2.5,0,0,0,1,0,0,0,-2.5, ldraw_lib__1_4chrd()],
// 1 71 0 0 -2.5 2.5 0 0 0 1 0 0 0 -2.5 1-4chrd.dat
  [1,71,0,0,-2.5,2.5,0,0,0,1,0,0,0,-2.5, ldraw_lib__1_4chrd()],
// 1 16 0 0 -2.5 2.5 0 0 0 1 0 0 0 2.5 4-4ndis.dat
  [1,16,0,0,-2.5,2.5,0,0,0,1,0,0,0,2.5, ldraw_lib__4_4ndis()],
// 1 16 0 0 0 10 0 0 0 1 0 0 0 -10 2-4ering.dat
  [1,16,0,0,0,10,0,0,0,1,0,0,0,-10, ldraw_lib__2_4ering()],
// 0 // Faces
// 0 // Light grey ring
// 3 71 1.2021 0 -1.2979 2.4042 0 -2.5 2.5 0 -2.5
  [3,71,1.2021,0,-1.2979,2.4042,0,-2.5,2.5,0,-2.5],
// 3 71 1.2021 0 -1.2979 2.5 0 -2.5 0 0 0
  [3,71,1.2021,0,-1.2979,2.5,0,-2.5,0,0,0],
// 3 71 1.2021 0 -1.2979 0 0 0 0 0 -.0958
  [3,71,1.2021,0,-1.2979,0,0,0,0,0,-.0958],
// 3 71 -1.2021 0 -1.2979 0 0 -.0958 0 0 0
  [3,71,-1.2021,0,-1.2979,0,0,-.0958,0,0,0],
// 3 71 -1.2021 0 -1.2979 0 0 0 -2.5 0 -2.5
  [3,71,-1.2021,0,-1.2979,0,0,0,-2.5,0,-2.5],
// 3 71 -1.2021 0 -1.2979 -2.5 0 -2.5 -2.4042 0 -2.5
  [3,71,-1.2021,0,-1.2979,-2.5,0,-2.5,-2.4042,0,-2.5],
// 3 71 -1.2021 0 -3.7021 -2.4042 0 -2.5 -2.5 0 -2.5
  [3,71,-1.2021,0,-3.7021,-2.4042,0,-2.5,-2.5,0,-2.5],
// 3 71 -1.2021 0 -3.7021 -2.5 0 -2.5 0 0 -5
  [3,71,-1.2021,0,-3.7021,-2.5,0,-2.5,0,0,-5],
// 3 71 -1.2021 0 -3.7021 0 0 -5 0 0 -4.9042
  [3,71,-1.2021,0,-3.7021,0,0,-5,0,0,-4.9042],
// 3 71 1.2021 0 -3.7021 0 0 -4.9042 0 0 -5
  [3,71,1.2021,0,-3.7021,0,0,-4.9042,0,0,-5],
// 3 71 1.2021 0 -3.7021 0 0 -5 2.5 0 -2.5
  [3,71,1.2021,0,-3.7021,0,0,-5,2.5,0,-2.5],
// 3 71 1.2021 0 -3.7021 2.5 0 -2.5 2.4042 0 -2.5
  [3,71,1.2021,0,-3.7021,2.5,0,-2.5,2.4042,0,-2.5],
// 0 // Light grey arc
// 4 71 -8.1818 0 7.0095 -8.414 0 9.5 -9.4155 0 9.5 -9.1652 0 6.8138
  [4,71,-8.1818,0,7.0095,-8.414,0,9.5,-9.4155,0,9.5,-9.1652,0,6.8138],
// 4 71 -8.1818 0 7.0095 -9.1652 0 6.8138 -8.7386 0 4.1499 -7.7952 0 4.5383
  [4,71,-8.1818,0,7.0095,-9.1652,0,6.8138,-8.7386,0,4.1499,-7.7952,0,4.5383],
// 4 71 -7.2374 0 2.1 -7.7952 0 4.5383 -8.7386 0 4.1499 -8.1163 0 1.5249
  [4,71,-7.2374,0,2.1,-7.7952,0,4.5383,-8.7386,0,4.1499,-8.1163,0,1.5249],
// 4 71 -7.2374 0 2.1 -8.1163 0 1.5249 -7.2651 0 -1.0351 -6.4809 0 -.2842
  [4,71,-7.2374,0,2.1,-8.1163,0,1.5249,-7.2651,0,-1.0351,-6.4809,0,-.2842],
// 4 71 -5.4806 0 -2.5767 -6.4809 0 -.2842 -7.2651 0 -1.0351 -6.1309 0 -3.483
  [4,71,-5.4806,0,-2.5767,-6.4809,0,-.2842,-7.2651,0,-1.0351,-6.1309,0,-3.483],
// 4 71 -5.4806 0 -2.5767 -6.1309 0 -3.483 -4.6193 0 -5.7175 -4.1558 0 -4.6984
  [4,71,-5.4806,0,-2.5767,-6.1309,0,-3.483,-4.6193,0,-5.7175,-4.1558,0,-4.6984],
// 4 71 -2.3697 0 -6.4495 -4.1558 0 -4.6984 -4.6193 0 -5.7175 -2.5901 0 -7.4953
  [4,71,-2.3697,0,-6.4495,-4.1558,0,-4.6984,-4.6193,0,-5.7175,-2.5901,0,-7.4953],
// 4 71 -2.3697 0 -6.4495 -2.5901 0 -7.4953 0 0 -8.25 0 0 -7.25
  [4,71,-2.3697,0,-6.4495,-2.5901,0,-7.4953,0,0,-8.25,0,0,-7.25],
// 4 71 8.1818 0 7.0095 9.1652 0 6.8138 9.4155 0 9.5 8.414 0 9.5
  [4,71,8.1818,0,7.0095,9.1652,0,6.8138,9.4155,0,9.5,8.414,0,9.5],
// 4 71 8.1818 0 7.0095 7.7952 0 4.5383 8.7386 0 4.1499 9.1652 0 6.8138
  [4,71,8.1818,0,7.0095,7.7952,0,4.5383,8.7386,0,4.1499,9.1652,0,6.8138],
// 4 71 7.2374 0 2.1 8.1163 0 1.5249 8.7386 0 4.1499 7.7952 0 4.5383
  [4,71,7.2374,0,2.1,8.1163,0,1.5249,8.7386,0,4.1499,7.7952,0,4.5383],
// 4 71 7.2374 0 2.1 6.4809 0 -.2842 7.2651 0 -1.0351 8.1163 0 1.5249
  [4,71,7.2374,0,2.1,6.4809,0,-.2842,7.2651,0,-1.0351,8.1163,0,1.5249],
// 4 71 5.4806 0 -2.5767 6.1309 0 -3.483 7.2651 0 -1.0351 6.4809 0 -.2842
  [4,71,5.4806,0,-2.5767,6.1309,0,-3.483,7.2651,0,-1.0351,6.4809,0,-.2842],
// 4 71 5.4806 0 -2.5767 4.1558 0 -4.6984 4.6193 0 -5.7175 6.1309 0 -3.483
  [4,71,5.4806,0,-2.5767,4.1558,0,-4.6984,4.6193,0,-5.7175,6.1309,0,-3.483],
// 4 71 2.3697 0 -6.4495 2.5901 0 -7.4953 4.6193 0 -5.7175 4.1558 0 -4.6984
  [4,71,2.3697,0,-6.4495,2.5901,0,-7.4953,4.6193,0,-5.7175,4.1558,0,-4.6984],
// 4 71 2.3697 0 -6.4495 0 0 -7.25 0 0 -8.25 2.5901 0 -7.4953
  [4,71,2.3697,0,-6.4495,0,0,-7.25,0,0,-8.25,2.5901,0,-7.4953],
// 0 // Neutral faces
// 4 16 -10 0 10 -10 0 0 -9.1652 0 6.8138 -9.4155 0 9.5
  [4,16,-10,0,10,-10,0,0,-9.1652,0,6.8138,-9.4155,0,9.5],
// 3 16 -10 0 10 -9.4155 0 9.5 -8.414 0 9.5
  [3,16,-10,0,10,-9.4155,0,9.5,-8.414,0,9.5],
// 4 16 -10 0 10 -8.414 0 9.5 8.414 0 9.5 10 0 10
  [4,16,-10,0,10,-8.414,0,9.5,8.414,0,9.5,10,0,10],
// 3 16 10 0 10 8.414 0 9.5 9.4155 0 9.5
  [3,16,10,0,10,8.414,0,9.5,9.4155,0,9.5],
// 4 16 10 0 10 9.4155 0 9.5 9.1652 0 6.8138 10 0 0
  [4,16,10,0,10,9.4155,0,9.5,9.1652,0,6.8138,10,0,0],
// 4 16 -8.1818 0 7.0095 8.1818 0 7.0095 8.414 0 9.5 -8.414 0 9.5
  [4,16,-8.1818,0,7.0095,8.1818,0,7.0095,8.414,0,9.5,-8.414,0,9.5],
// 3 16 -8.1818 0 7.0095 0 0 0 8.1818 0 7.0095
  [3,16,-8.1818,0,7.0095,0,0,0,8.1818,0,7.0095],
// 4 16 -2.5 0 0 0 0 0 -8.1818 0 7.0095 -7.7952 0 4.5383
  [4,16,-2.5,0,0,0,0,0,-8.1818,0,7.0095,-7.7952,0,4.5383],
// 4 16 -2.5 0 0 -7.7952 0 4.5383 -7.2374 0 2.1 -6.4809 0 -.2842
  [4,16,-2.5,0,0,-7.7952,0,4.5383,-7.2374,0,2.1,-6.4809,0,-.2842],
// 4 16 -2.5 0 0 -6.4809 0 -.2842 -5.4806 0 -2.5767 -2.5 0 -2.5
  [4,16,-2.5,0,0,-6.4809,0,-.2842,-5.4806,0,-2.5767,-2.5,0,-2.5],
// 4 16 2.5 0 0 7.7952 0 4.5383 8.1818 0 7.0095 0 0 0
  [4,16,2.5,0,0,7.7952,0,4.5383,8.1818,0,7.0095,0,0,0],
// 4 16 2.5 0 0 6.4809 0 -.2842 7.2374 0 2.1 7.7952 0 4.5383
  [4,16,2.5,0,0,6.4809,0,-.2842,7.2374,0,2.1,7.7952,0,4.5383],
// 4 16 2.5 0 0 2.5 0 -2.5 5.4806 0 -2.5767 6.4809 0 -.2842
  [4,16,2.5,0,0,2.5,0,-2.5,5.4806,0,-2.5767,6.4809,0,-.2842],
// 4 16 -2.5 0 -5 -2.5 0 -2.5 -5.4806 0 -2.5767 -4.1558 0 -4.6984
  [4,16,-2.5,0,-5,-2.5,0,-2.5,-5.4806,0,-2.5767,-4.1558,0,-4.6984],
// 4 16 -2.5 0 -5 -4.1558 0 -4.6984 -2.3697 0 -6.4495 0 0 -7.25
  [4,16,-2.5,0,-5,-4.1558,0,-4.6984,-2.3697,0,-6.4495,0,0,-7.25],
// 3 16 -2.5 0 -5 0 0 -7.25 0 0 -5
  [3,16,-2.5,0,-5,0,0,-7.25,0,0,-5],
// 4 16 2.5 0 -5 4.1558 0 -4.6984 5.4806 0 -2.5767 2.5 0 -2.5
  [4,16,2.5,0,-5,4.1558,0,-4.6984,5.4806,0,-2.5767,2.5,0,-2.5],
// 4 16 2.5 0 -5 0 0 -7.25 2.3697 0 -6.4495 4.1558 0 -4.6984
  [4,16,2.5,0,-5,0,0,-7.25,2.3697,0,-6.4495,4.1558,0,-4.6984],
// 3 16 2.5 0 -5 0 0 -5 0 0 -7.25
  [3,16,2.5,0,-5,0,0,-5,0,0,-7.25],
// 3 16 -10 0 0 -8.7386 0 4.1499 -9.1652 0 6.8138
  [3,16,-10,0,0,-8.7386,0,4.1499,-9.1652,0,6.8138],
// 3 16 -10 0 0 -8.1163 0 1.5249 -8.7386 0 4.1499
  [3,16,-10,0,0,-8.1163,0,1.5249,-8.7386,0,4.1499],
// 3 16 -10 0 0 -7.2651 0 -1.0351 -8.1163 0 1.5249
  [3,16,-10,0,0,-7.2651,0,-1.0351,-8.1163,0,1.5249],
// 4 16 -10 0 0 -9.239 0 -3.827 -6.1309 0 -3.483 -7.2651 0 -1.0351
  [4,16,-10,0,0,-9.239,0,-3.827,-6.1309,0,-3.483,-7.2651,0,-1.0351],
// 3 16 10 0 0 9.1652 0 6.8138 8.7386 0 4.1499
  [3,16,10,0,0,9.1652,0,6.8138,8.7386,0,4.1499],
// 3 16 10 0 0 8.7386 0 4.1499 8.1163 0 1.5249
  [3,16,10,0,0,8.7386,0,4.1499,8.1163,0,1.5249],
// 3 16 10 0 0 8.1163 0 1.5249 7.2651 0 -1.0351
  [3,16,10,0,0,8.1163,0,1.5249,7.2651,0,-1.0351],
// 4 16 10 0 0 7.2651 0 -1.0351 6.1309 0 -3.483 9.239 0 -3.827
  [4,16,10,0,0,7.2651,0,-1.0351,6.1309,0,-3.483,9.239,0,-3.827],
// 4 16 -7.071 0 -7.071 -4.6193 0 -5.7175 -6.1309 0 -3.483 -9.239 0 -3.827
  [4,16,-7.071,0,-7.071,-4.6193,0,-5.7175,-6.1309,0,-3.483,-9.239,0,-3.827],
// 4 16 -7.071 0 -7.071 -3.827 0 -9.239 -2.5901 0 -7.4953 -4.6193 0 -5.7175
  [4,16,-7.071,0,-7.071,-3.827,0,-9.239,-2.5901,0,-7.4953,-4.6193,0,-5.7175],
// 4 16 7.071 0 -7.071 9.239 0 -3.827 6.1309 0 -3.483 4.6193 0 -5.7175
  [4,16,7.071,0,-7.071,9.239,0,-3.827,6.1309,0,-3.483,4.6193,0,-5.7175],
// 4 16 7.071 0 -7.071 4.6193 0 -5.7175 2.5901 0 -7.4953 3.827 0 -9.239
  [4,16,7.071,0,-7.071,4.6193,0,-5.7175,2.5901,0,-7.4953,3.827,0,-9.239],
// 4 16 0 0 -10 0 0 -8.25 -2.5901 0 -7.4953 -3.827 0 -9.239
  [4,16,0,0,-10,0,0,-8.25,-2.5901,0,-7.4953,-3.827,0,-9.239],
// 4 16 0 0 -10 3.827 0 -9.239 2.5901 0 -7.4953 0 0 -8.25
  [4,16,0,0,-10,3.827,0,-9.239,2.5901,0,-7.4953,0,0,-8.25],
];
module ldraw_lib__24246p07(step=0, col=false, unit=2/5, alt=false, line=0.2, solid=!$preview)
    makepoly(ldraw_lib__24246p07(), step=step, col=col, unit=unit, alt=alt, line=line, solid=solid);
ldraw_lib__24246p07(line=0.2);
